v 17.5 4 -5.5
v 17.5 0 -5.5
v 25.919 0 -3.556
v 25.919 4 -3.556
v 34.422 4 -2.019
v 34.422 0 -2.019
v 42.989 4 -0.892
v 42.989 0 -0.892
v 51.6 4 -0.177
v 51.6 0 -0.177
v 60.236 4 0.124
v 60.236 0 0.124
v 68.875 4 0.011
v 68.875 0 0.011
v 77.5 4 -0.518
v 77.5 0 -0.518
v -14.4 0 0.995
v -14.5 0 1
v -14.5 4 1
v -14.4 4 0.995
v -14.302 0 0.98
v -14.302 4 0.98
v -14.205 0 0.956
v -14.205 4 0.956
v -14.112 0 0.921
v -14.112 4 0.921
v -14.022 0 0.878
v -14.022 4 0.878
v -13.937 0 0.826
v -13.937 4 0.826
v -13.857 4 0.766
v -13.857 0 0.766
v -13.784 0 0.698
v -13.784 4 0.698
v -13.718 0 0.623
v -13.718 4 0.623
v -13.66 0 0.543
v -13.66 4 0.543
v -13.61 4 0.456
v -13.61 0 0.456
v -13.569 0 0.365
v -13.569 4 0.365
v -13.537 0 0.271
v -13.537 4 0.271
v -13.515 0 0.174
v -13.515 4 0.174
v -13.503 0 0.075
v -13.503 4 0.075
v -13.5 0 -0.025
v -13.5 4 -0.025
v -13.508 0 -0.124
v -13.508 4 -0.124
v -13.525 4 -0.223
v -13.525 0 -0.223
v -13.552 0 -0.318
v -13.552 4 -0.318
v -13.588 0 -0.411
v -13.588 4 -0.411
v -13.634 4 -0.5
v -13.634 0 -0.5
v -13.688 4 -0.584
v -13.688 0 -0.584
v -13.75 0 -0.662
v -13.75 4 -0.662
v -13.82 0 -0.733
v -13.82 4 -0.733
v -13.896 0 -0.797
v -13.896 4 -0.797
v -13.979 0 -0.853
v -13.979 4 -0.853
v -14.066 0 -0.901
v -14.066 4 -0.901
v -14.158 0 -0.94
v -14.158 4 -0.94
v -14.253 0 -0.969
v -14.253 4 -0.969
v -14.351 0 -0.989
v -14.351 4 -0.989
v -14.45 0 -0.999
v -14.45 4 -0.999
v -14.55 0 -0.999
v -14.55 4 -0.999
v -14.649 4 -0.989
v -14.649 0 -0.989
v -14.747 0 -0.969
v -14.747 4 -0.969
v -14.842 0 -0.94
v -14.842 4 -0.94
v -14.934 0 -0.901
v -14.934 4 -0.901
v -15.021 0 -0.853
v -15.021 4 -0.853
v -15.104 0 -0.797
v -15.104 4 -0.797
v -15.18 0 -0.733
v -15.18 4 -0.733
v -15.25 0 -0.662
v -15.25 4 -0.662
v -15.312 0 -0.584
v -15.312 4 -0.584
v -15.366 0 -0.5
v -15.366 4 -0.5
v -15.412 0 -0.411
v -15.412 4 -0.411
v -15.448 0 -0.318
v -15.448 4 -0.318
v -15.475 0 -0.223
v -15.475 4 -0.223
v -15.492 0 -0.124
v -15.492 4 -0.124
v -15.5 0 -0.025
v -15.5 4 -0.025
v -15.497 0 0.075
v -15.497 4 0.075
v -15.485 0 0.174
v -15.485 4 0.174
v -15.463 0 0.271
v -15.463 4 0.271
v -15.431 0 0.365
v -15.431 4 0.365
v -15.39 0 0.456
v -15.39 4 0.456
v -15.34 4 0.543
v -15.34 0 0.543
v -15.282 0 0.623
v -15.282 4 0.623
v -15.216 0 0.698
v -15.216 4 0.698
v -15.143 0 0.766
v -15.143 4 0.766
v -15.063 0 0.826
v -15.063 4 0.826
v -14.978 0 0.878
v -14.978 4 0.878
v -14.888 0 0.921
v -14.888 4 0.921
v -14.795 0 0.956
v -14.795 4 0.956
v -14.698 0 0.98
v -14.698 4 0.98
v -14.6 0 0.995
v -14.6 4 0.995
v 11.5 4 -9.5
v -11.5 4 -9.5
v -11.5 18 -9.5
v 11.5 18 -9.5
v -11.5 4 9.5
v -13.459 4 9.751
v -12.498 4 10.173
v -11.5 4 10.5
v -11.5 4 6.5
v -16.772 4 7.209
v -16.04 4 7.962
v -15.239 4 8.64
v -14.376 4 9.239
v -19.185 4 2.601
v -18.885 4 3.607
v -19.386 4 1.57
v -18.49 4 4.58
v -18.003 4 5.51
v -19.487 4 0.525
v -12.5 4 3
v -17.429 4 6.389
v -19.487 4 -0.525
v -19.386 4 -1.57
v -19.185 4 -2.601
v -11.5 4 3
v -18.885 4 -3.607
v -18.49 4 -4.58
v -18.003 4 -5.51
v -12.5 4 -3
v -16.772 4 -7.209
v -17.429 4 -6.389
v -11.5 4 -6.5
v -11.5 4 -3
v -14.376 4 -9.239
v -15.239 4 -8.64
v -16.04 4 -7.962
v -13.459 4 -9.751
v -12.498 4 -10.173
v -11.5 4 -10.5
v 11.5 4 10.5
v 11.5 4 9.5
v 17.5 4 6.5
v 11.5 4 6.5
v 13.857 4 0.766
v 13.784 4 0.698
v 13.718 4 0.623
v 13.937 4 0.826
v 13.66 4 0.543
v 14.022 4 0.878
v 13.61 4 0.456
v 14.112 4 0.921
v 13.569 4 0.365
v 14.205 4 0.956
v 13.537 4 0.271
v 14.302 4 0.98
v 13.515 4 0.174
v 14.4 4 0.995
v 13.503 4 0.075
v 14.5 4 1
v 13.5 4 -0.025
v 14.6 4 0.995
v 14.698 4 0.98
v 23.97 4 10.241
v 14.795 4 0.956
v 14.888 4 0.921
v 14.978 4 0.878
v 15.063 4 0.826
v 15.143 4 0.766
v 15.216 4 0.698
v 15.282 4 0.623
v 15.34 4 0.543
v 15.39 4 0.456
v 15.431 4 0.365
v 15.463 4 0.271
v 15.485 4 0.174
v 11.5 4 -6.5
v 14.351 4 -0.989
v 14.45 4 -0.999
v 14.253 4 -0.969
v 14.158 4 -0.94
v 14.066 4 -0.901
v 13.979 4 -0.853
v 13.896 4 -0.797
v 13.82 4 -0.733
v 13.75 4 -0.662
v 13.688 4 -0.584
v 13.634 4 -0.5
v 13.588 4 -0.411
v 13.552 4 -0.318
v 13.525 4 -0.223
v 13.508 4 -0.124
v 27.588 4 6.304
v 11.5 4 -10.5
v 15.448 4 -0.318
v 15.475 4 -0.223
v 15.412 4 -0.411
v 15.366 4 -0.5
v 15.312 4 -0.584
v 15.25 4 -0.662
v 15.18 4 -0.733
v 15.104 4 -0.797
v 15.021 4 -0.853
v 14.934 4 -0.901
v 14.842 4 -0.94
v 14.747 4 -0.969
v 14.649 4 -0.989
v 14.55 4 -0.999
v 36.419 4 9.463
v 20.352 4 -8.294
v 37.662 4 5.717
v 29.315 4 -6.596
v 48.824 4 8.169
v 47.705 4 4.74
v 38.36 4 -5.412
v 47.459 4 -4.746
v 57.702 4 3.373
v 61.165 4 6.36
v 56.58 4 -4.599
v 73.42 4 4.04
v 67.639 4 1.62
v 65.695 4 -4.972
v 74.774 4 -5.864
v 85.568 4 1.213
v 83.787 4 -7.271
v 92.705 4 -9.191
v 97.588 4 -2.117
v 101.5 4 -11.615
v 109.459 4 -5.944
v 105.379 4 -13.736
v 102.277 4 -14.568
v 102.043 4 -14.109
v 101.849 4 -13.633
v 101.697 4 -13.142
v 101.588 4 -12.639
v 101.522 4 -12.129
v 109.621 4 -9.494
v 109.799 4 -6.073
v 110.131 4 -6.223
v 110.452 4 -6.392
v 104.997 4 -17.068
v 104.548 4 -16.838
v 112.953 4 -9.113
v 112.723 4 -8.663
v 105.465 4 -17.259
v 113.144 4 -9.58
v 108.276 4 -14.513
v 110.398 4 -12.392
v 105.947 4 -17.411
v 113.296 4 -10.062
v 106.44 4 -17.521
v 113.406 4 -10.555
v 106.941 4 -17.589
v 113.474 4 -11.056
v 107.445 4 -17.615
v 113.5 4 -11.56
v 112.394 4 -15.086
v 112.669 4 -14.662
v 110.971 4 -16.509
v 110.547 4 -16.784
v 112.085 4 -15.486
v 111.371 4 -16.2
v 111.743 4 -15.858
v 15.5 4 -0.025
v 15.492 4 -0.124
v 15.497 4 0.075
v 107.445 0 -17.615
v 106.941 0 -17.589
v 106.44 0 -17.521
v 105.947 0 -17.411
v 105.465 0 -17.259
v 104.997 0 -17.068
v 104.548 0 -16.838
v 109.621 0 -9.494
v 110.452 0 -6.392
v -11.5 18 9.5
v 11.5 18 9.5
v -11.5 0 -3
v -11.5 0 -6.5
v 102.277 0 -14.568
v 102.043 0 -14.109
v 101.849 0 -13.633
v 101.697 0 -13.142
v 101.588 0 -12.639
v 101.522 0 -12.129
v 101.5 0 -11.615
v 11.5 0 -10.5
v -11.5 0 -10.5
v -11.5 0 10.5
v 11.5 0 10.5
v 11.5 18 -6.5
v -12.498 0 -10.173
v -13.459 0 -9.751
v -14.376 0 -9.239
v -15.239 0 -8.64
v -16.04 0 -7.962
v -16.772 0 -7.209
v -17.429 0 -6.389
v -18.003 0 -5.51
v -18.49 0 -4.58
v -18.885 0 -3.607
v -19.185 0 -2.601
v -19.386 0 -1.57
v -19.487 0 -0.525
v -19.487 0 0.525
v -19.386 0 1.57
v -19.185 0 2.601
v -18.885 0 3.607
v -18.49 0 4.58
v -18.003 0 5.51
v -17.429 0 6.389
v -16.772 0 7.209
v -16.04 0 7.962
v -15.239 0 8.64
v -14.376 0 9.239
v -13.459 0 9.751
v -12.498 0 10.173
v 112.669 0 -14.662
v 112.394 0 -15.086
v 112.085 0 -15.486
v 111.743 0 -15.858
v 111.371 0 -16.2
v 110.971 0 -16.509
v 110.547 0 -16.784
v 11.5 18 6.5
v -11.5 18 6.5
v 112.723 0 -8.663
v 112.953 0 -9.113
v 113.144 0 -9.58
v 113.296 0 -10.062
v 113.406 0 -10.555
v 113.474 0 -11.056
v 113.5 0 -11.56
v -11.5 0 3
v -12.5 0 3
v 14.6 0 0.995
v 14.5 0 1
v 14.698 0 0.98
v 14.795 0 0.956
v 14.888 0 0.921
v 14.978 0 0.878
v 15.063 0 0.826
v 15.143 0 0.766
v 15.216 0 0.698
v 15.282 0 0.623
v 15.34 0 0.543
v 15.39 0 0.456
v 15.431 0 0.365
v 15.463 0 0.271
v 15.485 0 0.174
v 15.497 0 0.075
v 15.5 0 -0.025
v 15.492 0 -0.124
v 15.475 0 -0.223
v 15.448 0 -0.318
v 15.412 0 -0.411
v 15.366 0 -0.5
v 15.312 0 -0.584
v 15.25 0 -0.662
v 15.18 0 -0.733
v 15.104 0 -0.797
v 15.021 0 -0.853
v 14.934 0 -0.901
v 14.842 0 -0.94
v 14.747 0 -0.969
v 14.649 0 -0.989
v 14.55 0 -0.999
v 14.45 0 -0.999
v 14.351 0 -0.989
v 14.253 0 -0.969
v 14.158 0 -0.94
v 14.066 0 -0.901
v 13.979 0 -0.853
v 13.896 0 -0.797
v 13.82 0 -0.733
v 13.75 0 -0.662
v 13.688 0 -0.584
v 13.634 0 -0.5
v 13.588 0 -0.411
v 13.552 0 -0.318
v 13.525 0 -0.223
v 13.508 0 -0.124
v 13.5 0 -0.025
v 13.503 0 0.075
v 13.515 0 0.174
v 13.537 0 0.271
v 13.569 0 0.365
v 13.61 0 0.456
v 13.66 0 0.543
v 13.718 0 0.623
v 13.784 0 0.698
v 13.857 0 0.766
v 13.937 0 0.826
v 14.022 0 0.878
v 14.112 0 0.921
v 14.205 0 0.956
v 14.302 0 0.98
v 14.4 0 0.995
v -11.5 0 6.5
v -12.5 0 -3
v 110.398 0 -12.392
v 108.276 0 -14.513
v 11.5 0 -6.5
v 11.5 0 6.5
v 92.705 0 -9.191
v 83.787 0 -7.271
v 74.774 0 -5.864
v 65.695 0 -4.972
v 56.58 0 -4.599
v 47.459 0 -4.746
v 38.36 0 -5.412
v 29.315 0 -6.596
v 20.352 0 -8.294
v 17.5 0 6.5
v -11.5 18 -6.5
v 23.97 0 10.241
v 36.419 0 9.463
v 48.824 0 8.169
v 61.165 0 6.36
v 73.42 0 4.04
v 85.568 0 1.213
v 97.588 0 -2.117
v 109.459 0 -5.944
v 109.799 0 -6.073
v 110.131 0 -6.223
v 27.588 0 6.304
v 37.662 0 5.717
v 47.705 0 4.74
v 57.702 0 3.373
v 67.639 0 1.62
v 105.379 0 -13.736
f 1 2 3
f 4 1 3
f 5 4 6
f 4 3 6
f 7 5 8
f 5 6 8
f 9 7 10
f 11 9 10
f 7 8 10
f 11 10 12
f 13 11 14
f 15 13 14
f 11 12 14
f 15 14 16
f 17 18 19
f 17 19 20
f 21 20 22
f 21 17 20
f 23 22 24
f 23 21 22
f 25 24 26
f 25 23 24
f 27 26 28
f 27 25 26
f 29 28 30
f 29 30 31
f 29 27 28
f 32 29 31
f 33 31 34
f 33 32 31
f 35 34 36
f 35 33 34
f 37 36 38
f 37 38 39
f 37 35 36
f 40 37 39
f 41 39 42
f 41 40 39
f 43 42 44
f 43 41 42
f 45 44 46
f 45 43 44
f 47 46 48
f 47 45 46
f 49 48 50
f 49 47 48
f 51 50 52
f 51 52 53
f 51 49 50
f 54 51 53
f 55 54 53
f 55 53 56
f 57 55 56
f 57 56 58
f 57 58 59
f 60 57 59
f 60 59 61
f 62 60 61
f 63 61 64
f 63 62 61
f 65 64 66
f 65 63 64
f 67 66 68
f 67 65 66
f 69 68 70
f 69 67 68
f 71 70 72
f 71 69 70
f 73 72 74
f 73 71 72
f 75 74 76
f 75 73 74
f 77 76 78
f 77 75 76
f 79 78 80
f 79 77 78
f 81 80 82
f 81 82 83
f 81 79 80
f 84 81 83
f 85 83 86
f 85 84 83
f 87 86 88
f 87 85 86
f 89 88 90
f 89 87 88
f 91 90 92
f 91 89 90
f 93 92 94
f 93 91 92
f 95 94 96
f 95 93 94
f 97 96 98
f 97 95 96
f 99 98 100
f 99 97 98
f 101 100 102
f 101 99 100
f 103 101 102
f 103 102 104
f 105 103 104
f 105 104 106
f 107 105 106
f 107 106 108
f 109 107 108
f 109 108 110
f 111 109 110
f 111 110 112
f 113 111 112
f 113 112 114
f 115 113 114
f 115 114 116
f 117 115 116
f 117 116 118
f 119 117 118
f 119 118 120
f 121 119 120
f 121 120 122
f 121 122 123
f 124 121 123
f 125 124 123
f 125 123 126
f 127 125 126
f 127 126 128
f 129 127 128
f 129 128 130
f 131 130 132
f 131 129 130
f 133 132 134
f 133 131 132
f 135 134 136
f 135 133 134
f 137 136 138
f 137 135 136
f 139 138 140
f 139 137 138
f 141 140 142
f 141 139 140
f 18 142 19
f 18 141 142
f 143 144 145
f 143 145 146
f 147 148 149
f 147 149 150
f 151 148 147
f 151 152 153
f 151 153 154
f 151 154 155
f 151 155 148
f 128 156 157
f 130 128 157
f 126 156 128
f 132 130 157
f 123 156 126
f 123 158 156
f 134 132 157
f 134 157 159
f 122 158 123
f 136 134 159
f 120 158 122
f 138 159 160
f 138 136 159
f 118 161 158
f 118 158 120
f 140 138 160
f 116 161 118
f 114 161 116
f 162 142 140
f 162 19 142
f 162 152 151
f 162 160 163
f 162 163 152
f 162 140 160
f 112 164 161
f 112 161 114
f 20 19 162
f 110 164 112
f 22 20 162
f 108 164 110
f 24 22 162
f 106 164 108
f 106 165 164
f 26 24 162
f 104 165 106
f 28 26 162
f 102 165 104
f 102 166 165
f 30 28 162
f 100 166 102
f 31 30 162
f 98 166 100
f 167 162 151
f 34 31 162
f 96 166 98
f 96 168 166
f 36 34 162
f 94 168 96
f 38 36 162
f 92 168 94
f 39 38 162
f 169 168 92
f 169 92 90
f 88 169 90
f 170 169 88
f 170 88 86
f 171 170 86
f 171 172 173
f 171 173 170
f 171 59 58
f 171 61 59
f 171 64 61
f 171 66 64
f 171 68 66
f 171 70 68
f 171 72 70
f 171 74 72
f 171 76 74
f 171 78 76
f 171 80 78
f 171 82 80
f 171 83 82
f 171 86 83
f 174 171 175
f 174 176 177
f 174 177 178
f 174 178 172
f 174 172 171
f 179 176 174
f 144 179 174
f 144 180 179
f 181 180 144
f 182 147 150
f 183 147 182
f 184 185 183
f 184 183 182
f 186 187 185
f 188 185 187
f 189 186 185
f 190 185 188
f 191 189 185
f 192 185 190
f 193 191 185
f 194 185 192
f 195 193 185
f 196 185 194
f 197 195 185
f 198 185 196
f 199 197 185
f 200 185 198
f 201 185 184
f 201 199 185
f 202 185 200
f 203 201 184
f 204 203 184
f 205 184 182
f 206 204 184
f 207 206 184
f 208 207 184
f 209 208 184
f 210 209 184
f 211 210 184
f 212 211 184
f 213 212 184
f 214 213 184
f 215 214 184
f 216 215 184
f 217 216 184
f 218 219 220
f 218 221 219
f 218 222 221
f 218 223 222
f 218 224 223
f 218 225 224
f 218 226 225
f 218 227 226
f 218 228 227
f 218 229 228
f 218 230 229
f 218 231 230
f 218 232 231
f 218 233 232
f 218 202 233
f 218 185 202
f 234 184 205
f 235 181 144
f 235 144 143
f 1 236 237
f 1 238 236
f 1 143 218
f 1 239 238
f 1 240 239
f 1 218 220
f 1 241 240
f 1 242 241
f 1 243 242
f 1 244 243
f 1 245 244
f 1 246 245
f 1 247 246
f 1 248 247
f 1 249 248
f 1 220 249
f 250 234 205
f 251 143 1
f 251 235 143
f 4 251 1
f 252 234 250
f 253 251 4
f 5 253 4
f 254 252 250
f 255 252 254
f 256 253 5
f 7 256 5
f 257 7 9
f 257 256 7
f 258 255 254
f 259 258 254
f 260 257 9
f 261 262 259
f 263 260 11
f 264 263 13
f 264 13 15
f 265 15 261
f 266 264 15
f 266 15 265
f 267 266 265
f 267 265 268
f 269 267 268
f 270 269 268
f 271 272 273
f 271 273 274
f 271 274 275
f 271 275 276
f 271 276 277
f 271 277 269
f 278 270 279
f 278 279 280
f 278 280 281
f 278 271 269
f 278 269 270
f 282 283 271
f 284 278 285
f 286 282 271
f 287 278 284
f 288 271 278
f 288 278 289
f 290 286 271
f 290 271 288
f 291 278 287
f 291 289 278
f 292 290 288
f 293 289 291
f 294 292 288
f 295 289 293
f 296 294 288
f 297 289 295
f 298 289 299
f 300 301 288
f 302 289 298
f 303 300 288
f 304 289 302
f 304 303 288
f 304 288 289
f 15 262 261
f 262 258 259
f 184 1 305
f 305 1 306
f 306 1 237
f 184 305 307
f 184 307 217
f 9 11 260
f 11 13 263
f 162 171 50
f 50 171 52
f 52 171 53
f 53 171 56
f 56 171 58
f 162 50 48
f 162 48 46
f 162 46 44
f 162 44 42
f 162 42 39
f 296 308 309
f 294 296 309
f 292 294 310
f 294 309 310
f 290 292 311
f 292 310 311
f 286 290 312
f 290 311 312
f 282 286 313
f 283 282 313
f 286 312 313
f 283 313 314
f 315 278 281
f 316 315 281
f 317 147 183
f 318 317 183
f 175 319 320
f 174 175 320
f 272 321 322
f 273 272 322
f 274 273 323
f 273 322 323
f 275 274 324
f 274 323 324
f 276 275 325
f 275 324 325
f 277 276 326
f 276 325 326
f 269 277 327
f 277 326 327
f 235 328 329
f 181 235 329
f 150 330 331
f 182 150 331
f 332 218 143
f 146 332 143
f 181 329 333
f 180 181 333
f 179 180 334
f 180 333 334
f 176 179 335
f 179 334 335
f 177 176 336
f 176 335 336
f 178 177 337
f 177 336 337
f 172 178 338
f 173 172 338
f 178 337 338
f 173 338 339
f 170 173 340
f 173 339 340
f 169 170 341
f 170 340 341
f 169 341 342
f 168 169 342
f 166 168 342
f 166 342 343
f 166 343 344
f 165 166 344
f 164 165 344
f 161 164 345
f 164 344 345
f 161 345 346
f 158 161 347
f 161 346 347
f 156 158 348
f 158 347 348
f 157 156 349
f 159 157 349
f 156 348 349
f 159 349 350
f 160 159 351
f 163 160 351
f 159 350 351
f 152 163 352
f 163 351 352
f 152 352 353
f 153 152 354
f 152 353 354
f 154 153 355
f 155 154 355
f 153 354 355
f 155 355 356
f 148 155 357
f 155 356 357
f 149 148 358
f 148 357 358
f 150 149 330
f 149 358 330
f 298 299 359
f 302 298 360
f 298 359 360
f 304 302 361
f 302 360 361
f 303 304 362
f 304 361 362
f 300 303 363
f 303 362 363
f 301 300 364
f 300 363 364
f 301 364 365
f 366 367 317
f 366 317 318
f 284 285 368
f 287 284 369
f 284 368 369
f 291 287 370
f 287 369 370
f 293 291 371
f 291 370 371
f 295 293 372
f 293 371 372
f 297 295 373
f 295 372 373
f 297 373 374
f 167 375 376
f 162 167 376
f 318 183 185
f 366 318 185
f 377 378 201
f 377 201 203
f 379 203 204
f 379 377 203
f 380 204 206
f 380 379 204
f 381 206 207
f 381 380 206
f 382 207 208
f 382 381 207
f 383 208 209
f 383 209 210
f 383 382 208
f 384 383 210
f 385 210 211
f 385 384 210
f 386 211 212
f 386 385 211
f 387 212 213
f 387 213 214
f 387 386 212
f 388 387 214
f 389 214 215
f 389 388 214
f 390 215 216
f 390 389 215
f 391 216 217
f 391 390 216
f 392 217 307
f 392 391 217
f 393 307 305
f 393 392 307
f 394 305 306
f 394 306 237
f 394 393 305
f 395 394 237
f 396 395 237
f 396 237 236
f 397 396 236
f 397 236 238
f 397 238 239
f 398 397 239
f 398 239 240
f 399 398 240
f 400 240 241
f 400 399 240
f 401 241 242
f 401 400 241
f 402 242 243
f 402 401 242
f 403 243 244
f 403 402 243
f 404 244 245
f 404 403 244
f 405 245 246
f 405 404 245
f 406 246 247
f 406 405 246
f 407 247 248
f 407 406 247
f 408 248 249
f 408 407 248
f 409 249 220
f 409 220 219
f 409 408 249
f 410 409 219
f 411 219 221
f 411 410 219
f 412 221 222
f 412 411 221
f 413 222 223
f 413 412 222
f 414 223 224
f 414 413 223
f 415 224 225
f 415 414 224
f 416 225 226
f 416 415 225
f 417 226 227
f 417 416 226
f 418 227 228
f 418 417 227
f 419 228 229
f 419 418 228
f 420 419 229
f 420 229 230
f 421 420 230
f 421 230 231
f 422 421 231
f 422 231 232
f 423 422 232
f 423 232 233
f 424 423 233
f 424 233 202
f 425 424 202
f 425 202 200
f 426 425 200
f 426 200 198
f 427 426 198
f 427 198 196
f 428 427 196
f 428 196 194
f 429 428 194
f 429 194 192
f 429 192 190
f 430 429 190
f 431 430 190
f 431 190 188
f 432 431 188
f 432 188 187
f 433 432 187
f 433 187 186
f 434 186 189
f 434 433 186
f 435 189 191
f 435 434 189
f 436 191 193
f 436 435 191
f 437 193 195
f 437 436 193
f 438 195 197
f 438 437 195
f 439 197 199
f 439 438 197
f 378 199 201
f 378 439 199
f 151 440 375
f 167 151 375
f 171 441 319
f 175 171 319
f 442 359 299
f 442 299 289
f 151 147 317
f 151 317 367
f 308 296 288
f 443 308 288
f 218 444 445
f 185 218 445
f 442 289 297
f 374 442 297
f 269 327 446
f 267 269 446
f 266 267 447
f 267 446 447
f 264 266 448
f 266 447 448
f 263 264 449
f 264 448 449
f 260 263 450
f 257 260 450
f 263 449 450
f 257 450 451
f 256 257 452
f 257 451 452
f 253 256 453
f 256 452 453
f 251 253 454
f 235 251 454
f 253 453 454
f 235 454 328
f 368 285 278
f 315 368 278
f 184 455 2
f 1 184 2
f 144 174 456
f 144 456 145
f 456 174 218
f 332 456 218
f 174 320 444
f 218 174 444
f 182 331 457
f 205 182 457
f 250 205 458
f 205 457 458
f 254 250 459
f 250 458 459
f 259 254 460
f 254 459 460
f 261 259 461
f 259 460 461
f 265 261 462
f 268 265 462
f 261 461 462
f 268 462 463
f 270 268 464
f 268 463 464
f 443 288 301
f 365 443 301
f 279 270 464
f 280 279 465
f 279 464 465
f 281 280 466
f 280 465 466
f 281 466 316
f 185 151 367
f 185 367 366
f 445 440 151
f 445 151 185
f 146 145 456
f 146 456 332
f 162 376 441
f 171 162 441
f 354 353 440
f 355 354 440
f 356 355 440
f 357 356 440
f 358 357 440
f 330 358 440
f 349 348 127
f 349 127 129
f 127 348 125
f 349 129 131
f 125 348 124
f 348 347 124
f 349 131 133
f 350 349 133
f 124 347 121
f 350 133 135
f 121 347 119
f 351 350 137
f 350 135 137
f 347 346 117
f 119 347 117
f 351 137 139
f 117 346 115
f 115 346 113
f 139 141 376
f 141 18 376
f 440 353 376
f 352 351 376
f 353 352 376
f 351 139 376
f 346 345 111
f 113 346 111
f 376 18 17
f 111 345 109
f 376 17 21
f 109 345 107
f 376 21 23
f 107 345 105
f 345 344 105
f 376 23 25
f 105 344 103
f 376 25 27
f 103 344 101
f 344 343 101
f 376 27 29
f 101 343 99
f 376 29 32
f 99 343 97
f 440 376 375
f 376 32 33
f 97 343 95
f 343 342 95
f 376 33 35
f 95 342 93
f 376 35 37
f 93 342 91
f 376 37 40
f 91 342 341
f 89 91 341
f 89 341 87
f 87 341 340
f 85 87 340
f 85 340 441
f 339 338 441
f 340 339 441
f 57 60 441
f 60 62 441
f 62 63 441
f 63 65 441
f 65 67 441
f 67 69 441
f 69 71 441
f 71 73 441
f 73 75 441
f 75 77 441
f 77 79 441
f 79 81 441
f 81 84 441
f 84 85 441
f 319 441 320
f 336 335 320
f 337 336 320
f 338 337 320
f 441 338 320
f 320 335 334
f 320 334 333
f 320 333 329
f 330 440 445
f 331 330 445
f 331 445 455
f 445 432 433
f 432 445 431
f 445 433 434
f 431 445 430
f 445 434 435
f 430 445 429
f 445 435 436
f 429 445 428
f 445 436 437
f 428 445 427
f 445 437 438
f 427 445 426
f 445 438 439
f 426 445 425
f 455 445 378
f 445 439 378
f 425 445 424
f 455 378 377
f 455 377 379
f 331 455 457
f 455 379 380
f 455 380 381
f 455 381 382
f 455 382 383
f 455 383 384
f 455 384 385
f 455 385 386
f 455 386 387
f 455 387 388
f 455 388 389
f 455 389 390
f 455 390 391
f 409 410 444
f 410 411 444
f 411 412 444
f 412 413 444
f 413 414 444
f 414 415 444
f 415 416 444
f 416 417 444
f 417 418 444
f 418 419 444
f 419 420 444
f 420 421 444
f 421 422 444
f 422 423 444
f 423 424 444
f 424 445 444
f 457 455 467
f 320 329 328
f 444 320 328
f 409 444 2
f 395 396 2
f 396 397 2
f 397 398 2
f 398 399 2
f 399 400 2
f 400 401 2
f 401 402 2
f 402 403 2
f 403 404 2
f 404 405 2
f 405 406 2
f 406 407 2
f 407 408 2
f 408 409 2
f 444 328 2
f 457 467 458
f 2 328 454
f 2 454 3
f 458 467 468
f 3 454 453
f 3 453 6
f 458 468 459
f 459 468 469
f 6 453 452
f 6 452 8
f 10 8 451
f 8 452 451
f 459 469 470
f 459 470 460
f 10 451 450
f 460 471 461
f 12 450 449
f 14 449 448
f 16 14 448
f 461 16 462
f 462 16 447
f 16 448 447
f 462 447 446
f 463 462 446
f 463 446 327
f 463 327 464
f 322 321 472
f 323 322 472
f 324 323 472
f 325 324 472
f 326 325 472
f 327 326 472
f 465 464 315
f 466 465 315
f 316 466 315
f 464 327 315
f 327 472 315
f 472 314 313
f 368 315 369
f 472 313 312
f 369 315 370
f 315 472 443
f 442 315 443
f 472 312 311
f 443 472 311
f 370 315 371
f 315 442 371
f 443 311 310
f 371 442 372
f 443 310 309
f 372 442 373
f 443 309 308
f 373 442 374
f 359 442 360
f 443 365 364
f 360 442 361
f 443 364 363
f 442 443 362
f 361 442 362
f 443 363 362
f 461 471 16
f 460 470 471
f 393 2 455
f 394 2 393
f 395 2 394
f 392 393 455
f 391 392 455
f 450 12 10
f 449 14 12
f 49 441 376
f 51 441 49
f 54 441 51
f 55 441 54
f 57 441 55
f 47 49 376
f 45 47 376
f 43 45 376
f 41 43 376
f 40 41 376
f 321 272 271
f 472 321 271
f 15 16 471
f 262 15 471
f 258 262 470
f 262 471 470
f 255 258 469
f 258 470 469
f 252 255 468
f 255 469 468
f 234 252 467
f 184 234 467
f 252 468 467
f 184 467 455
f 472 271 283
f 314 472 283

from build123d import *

# Parameters (mm, degrees)
SKETCH1_R           = 1
BOSS_EXTRUDE1_DEPTH = 4
SKETCH2_W           = 23
SKETCH2_H           = 3
BOSS_EXTRUDE2_DEPTH = 14
CUT_EXTRUDE1_DEPTH  = 116.708871167


with BuildPart() as part:
    # Sketch1 → Boss-Extrude1 (new body)
    with BuildSketch(Plane(origin=(0, 0, 0), x_dir=(1, 0, 0), z_dir=(0, 1, 0))):
        with BuildLine():
            ThreePointArc((-11.5, 10.5), (-19.5, 0), (-11.5, -10.5))
            Line((-11.5, -10.5), (11.5, -10.5))
            ThreePointArc((11.5, -10.5), (61.164895038, -6.360437032), (109.459183673, 5.944011994))
            ThreePointArc((109.459183673, 5.944011994), (110.981730745, 16.501597862), (101.5, 11.615131754))
            ThreePointArc((101.5, 11.615131754), (56.580029181, 4.598574614), (11.5, 10.5))
            Line((11.5, 10.5), (-11.5, 10.5))
        make_face()
        with Locations(Location((-14.5, 0, 0), (0, 0, 270))):
            Circle(SKETCH1_R, mode=Mode.SUBTRACT)
        Polygon((11.5, -6.5), (-11.5, -6.5), (-11.5, -3), (-12.5, -3), (-12.5, 3), (-11.5, 3), (-11.5, 6.5), (11.5, 6.5), align=None, mode=Mode.SUBTRACT)
        with Locations(Location((14.5, 0, 0), (0, 0, 270))):
            Circle(SKETCH1_R, mode=Mode.SUBTRACT)
        with BuildLine():
            Line((17.5, -6.5), (17.5, 5.5))
            ThreePointArc((17.5, 5.5), (47.290216061, 0.482498836), (77.5, 0.517787187))
            ThreePointArc((77.5, 0.517787187), (47.704508509, -4.739593528), (17.5, -6.5))
        make_face(mode=Mode.SUBTRACT)
    extrude(amount=BOSS_EXTRUDE1_DEPTH)

    # Sketch2 → Boss-Extrude2 (add)
    with BuildSketch(Plane(origin=(0, 4, 0), x_dir=(1, 0, 0), z_dir=(0, 1, 0))):
        with Locations((0, -8)):
            Rectangle(SKETCH2_W, SKETCH2_H)
        with Locations((0, 8)):
            Rectangle(SKETCH2_W, SKETCH2_H)
    extrude(amount=BOSS_EXTRUDE2_DEPTH)

    # Sketch3 → Cut-Extrude1 (cut, through all)
    with BuildSketch(Plane(origin=(0, 4, 0), x_dir=(1, 0, 0), z_dir=(0, 1, 0))):
        with BuildLine():
            Line((102.276706609, 14.567623271), (105.378679656, 13.736452098))
            Line((105.378679656, 13.736452098), (104.547508484, 16.838425145))
            ThreePointArc((104.547508484, 16.838425145), (103.257359313, 15.857772441), (102.276706609, 14.567623271))
        make_face()
        with BuildLine():
            ThreePointArc((110.54725901, 16.783711107), (109.052914271, 17.410686712), (107.445285962, 17.61488228))
            Line((107.445285962, 17.61488228), (108.276457135, 14.512909233))
            Line((108.276457135, 14.512909233), (110.54725901, 16.783711107))
        make_face()
        with BuildLine():
            ThreePointArc((113.499750526, 11.560417717), (113.295554958, 13.168046025), (112.668579353, 14.662390764))
            Line((112.668579353, 14.662390764), (110.397777479, 12.391588889))
            Line((110.397777479, 12.391588889), (113.499750526, 11.560417717))
        make_face()
        with BuildLine():
            ThreePointArc((110.452491516, 6.391838363), (111.742640687, 7.372491067), (112.723293391, 8.662640238))
            Line((112.723293391, 8.662640238), (109.621320344, 9.493811411))
            Line((109.621320344, 9.493811411), (110.452491516, 6.391838363))
        make_face()
    extrude(amount=-CUT_EXTRUDE1_DEPTH, mode=Mode.SUBTRACT)


solid = part.part
